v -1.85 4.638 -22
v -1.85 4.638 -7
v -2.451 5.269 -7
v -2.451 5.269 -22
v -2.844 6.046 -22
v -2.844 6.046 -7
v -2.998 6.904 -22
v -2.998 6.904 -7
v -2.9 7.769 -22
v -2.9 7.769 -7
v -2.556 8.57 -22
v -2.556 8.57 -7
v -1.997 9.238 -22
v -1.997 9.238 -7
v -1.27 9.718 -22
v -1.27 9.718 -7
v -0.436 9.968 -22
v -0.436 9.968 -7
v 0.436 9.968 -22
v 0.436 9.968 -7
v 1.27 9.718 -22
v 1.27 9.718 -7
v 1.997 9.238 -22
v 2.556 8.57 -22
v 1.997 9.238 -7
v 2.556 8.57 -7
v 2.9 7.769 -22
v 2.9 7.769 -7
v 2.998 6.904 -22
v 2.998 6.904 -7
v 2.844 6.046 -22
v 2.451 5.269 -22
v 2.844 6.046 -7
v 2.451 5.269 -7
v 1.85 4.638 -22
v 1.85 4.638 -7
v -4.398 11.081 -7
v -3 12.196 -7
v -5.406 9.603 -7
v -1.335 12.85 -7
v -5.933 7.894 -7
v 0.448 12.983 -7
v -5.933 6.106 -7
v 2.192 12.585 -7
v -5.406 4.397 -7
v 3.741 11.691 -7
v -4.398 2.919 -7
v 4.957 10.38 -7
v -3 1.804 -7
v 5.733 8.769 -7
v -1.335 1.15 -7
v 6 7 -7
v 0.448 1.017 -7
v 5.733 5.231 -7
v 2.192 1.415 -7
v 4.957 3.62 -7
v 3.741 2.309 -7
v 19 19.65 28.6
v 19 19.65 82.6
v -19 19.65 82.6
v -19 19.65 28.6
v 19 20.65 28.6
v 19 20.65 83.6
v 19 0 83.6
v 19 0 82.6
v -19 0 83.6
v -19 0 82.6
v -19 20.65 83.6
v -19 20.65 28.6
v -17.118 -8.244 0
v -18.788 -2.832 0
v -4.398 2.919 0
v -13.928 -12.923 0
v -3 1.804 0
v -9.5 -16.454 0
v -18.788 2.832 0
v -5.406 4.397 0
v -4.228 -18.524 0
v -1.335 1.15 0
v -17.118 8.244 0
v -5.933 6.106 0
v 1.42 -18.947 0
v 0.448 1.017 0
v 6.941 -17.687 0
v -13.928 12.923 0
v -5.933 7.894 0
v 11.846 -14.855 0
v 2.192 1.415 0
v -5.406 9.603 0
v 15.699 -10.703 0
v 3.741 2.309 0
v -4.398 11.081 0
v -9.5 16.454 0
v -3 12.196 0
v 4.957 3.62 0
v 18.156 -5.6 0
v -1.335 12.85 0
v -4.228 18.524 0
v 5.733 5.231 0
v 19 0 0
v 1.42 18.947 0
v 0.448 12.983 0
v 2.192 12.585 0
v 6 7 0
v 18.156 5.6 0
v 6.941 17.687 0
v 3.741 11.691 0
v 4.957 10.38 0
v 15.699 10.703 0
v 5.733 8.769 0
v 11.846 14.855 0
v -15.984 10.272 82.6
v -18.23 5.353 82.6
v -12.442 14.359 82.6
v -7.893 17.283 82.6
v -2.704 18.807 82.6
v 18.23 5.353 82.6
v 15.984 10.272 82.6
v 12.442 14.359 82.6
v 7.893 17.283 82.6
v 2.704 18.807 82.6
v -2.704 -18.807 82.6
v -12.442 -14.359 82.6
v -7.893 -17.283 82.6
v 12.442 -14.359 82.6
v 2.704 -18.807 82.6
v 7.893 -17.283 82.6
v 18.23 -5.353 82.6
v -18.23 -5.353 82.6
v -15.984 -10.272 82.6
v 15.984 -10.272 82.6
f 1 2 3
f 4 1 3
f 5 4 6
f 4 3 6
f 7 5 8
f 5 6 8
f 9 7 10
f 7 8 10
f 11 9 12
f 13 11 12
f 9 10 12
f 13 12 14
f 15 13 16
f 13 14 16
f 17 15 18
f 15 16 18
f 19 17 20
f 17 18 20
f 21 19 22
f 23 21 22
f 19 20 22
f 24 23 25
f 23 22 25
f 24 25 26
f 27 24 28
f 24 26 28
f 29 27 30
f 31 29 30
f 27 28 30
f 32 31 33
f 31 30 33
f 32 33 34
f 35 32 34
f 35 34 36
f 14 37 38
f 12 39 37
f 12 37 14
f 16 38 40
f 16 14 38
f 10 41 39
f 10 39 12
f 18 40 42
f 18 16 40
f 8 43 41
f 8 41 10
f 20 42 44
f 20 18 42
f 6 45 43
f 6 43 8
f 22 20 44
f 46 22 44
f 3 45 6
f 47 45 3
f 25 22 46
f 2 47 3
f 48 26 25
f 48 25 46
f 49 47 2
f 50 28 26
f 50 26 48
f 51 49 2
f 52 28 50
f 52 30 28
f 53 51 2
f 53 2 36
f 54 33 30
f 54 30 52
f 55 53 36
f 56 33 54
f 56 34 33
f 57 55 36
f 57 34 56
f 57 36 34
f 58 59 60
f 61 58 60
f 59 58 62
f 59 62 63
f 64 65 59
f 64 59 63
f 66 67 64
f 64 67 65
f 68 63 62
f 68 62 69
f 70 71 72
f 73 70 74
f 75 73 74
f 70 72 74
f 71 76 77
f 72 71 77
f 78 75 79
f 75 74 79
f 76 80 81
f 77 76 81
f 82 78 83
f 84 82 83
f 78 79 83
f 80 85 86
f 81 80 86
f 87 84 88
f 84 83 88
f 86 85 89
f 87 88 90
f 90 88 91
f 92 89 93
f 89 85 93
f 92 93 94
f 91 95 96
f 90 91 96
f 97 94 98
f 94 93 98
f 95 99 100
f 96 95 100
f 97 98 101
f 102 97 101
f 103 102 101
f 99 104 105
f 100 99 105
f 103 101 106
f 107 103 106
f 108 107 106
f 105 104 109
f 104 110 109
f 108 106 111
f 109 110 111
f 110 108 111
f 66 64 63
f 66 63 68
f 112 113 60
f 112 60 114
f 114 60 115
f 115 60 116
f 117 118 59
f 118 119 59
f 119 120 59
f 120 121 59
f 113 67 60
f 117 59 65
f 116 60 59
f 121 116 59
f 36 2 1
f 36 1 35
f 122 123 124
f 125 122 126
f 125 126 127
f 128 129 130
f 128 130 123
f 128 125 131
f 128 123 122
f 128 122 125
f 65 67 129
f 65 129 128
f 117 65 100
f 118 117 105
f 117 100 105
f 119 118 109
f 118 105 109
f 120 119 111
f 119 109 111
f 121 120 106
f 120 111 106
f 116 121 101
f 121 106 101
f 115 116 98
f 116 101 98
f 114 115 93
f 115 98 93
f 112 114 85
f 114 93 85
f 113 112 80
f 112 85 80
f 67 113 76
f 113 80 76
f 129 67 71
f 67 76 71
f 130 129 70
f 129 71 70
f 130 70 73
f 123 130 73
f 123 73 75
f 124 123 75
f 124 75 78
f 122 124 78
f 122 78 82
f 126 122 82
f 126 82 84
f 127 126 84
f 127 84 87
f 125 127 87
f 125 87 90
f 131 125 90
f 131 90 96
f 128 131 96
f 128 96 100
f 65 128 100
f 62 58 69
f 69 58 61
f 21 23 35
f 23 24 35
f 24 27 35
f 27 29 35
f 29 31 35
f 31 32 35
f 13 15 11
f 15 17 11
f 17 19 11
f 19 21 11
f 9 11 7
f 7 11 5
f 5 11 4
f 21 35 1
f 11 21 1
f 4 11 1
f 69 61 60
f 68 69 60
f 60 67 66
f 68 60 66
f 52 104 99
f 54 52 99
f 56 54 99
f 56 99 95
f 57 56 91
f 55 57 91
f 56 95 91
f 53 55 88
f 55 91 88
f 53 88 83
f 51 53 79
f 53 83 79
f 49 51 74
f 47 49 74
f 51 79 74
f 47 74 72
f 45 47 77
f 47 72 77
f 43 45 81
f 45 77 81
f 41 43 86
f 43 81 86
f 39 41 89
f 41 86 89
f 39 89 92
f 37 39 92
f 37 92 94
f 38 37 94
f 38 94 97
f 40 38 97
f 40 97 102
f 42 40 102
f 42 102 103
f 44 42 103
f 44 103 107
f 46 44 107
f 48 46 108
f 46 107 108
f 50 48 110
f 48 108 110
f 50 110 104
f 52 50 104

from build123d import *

# Parameters (mm, degrees)
SKETCH_R     = 19
PAD_DEPTH    = 82.6
SKETCH001_R  = 6
PAD001_DEPTH = 7
PAD002_DEPTH = 15
SKETCH003_W  = 38
SKETCH003_H  = 19.65
PAD003_DEPTH = 1
SKETCH005_W  = 38
SKETCH005_H  = 55
PAD004_DEPTH = 1


with BuildPart() as part:
    # Sketch → Pad (new body)
    with BuildSketch(Plane.XY):
        Circle(SKETCH_R)
    extrude(amount=PAD_DEPTH)

    # Sketch001 → Pad001 (new body)
    with BuildSketch(Plane(origin=(0, 0, 0), x_dir=(1, 0, 0), z_dir=(0, 0, -1))):
        with Locations((0, -7)):
            Circle(SKETCH001_R)
    extrude(amount=PAD001_DEPTH)

    # Sketch002 → Pad002 (new body)
    with BuildSketch(Plane(origin=(0, 0, -7), x_dir=(1, 0, 0), z_dir=(0, 0, -1))):
        with BuildLine():
            Line((-1.85, -4.638327), (1.85, -4.638327))
            ThreePointArc((-1.85, -4.638327), (0, -10), (1.85, -4.638327))
        make_face()
    extrude(amount=PAD002_DEPTH)

    # Sketch003 → Pad003 (new body)
    with BuildSketch(Plane.XY.offset(82.6)):
        with Locations((0, 9.825)):
            Rectangle(SKETCH003_W, SKETCH003_H)
    extrude(amount=PAD003_DEPTH)

    # Sketch005 → Pad004 (new body)
    with BuildSketch(Plane(origin=(0, 19.65, 0), x_dir=(-1, 0, 0), z_dir=(0, 1, 0))):
        with Locations((0, 56.1)):
            Rectangle(SKETCH005_W, SKETCH005_H)
    extrude(amount=PAD004_DEPTH)


solid = part.part
